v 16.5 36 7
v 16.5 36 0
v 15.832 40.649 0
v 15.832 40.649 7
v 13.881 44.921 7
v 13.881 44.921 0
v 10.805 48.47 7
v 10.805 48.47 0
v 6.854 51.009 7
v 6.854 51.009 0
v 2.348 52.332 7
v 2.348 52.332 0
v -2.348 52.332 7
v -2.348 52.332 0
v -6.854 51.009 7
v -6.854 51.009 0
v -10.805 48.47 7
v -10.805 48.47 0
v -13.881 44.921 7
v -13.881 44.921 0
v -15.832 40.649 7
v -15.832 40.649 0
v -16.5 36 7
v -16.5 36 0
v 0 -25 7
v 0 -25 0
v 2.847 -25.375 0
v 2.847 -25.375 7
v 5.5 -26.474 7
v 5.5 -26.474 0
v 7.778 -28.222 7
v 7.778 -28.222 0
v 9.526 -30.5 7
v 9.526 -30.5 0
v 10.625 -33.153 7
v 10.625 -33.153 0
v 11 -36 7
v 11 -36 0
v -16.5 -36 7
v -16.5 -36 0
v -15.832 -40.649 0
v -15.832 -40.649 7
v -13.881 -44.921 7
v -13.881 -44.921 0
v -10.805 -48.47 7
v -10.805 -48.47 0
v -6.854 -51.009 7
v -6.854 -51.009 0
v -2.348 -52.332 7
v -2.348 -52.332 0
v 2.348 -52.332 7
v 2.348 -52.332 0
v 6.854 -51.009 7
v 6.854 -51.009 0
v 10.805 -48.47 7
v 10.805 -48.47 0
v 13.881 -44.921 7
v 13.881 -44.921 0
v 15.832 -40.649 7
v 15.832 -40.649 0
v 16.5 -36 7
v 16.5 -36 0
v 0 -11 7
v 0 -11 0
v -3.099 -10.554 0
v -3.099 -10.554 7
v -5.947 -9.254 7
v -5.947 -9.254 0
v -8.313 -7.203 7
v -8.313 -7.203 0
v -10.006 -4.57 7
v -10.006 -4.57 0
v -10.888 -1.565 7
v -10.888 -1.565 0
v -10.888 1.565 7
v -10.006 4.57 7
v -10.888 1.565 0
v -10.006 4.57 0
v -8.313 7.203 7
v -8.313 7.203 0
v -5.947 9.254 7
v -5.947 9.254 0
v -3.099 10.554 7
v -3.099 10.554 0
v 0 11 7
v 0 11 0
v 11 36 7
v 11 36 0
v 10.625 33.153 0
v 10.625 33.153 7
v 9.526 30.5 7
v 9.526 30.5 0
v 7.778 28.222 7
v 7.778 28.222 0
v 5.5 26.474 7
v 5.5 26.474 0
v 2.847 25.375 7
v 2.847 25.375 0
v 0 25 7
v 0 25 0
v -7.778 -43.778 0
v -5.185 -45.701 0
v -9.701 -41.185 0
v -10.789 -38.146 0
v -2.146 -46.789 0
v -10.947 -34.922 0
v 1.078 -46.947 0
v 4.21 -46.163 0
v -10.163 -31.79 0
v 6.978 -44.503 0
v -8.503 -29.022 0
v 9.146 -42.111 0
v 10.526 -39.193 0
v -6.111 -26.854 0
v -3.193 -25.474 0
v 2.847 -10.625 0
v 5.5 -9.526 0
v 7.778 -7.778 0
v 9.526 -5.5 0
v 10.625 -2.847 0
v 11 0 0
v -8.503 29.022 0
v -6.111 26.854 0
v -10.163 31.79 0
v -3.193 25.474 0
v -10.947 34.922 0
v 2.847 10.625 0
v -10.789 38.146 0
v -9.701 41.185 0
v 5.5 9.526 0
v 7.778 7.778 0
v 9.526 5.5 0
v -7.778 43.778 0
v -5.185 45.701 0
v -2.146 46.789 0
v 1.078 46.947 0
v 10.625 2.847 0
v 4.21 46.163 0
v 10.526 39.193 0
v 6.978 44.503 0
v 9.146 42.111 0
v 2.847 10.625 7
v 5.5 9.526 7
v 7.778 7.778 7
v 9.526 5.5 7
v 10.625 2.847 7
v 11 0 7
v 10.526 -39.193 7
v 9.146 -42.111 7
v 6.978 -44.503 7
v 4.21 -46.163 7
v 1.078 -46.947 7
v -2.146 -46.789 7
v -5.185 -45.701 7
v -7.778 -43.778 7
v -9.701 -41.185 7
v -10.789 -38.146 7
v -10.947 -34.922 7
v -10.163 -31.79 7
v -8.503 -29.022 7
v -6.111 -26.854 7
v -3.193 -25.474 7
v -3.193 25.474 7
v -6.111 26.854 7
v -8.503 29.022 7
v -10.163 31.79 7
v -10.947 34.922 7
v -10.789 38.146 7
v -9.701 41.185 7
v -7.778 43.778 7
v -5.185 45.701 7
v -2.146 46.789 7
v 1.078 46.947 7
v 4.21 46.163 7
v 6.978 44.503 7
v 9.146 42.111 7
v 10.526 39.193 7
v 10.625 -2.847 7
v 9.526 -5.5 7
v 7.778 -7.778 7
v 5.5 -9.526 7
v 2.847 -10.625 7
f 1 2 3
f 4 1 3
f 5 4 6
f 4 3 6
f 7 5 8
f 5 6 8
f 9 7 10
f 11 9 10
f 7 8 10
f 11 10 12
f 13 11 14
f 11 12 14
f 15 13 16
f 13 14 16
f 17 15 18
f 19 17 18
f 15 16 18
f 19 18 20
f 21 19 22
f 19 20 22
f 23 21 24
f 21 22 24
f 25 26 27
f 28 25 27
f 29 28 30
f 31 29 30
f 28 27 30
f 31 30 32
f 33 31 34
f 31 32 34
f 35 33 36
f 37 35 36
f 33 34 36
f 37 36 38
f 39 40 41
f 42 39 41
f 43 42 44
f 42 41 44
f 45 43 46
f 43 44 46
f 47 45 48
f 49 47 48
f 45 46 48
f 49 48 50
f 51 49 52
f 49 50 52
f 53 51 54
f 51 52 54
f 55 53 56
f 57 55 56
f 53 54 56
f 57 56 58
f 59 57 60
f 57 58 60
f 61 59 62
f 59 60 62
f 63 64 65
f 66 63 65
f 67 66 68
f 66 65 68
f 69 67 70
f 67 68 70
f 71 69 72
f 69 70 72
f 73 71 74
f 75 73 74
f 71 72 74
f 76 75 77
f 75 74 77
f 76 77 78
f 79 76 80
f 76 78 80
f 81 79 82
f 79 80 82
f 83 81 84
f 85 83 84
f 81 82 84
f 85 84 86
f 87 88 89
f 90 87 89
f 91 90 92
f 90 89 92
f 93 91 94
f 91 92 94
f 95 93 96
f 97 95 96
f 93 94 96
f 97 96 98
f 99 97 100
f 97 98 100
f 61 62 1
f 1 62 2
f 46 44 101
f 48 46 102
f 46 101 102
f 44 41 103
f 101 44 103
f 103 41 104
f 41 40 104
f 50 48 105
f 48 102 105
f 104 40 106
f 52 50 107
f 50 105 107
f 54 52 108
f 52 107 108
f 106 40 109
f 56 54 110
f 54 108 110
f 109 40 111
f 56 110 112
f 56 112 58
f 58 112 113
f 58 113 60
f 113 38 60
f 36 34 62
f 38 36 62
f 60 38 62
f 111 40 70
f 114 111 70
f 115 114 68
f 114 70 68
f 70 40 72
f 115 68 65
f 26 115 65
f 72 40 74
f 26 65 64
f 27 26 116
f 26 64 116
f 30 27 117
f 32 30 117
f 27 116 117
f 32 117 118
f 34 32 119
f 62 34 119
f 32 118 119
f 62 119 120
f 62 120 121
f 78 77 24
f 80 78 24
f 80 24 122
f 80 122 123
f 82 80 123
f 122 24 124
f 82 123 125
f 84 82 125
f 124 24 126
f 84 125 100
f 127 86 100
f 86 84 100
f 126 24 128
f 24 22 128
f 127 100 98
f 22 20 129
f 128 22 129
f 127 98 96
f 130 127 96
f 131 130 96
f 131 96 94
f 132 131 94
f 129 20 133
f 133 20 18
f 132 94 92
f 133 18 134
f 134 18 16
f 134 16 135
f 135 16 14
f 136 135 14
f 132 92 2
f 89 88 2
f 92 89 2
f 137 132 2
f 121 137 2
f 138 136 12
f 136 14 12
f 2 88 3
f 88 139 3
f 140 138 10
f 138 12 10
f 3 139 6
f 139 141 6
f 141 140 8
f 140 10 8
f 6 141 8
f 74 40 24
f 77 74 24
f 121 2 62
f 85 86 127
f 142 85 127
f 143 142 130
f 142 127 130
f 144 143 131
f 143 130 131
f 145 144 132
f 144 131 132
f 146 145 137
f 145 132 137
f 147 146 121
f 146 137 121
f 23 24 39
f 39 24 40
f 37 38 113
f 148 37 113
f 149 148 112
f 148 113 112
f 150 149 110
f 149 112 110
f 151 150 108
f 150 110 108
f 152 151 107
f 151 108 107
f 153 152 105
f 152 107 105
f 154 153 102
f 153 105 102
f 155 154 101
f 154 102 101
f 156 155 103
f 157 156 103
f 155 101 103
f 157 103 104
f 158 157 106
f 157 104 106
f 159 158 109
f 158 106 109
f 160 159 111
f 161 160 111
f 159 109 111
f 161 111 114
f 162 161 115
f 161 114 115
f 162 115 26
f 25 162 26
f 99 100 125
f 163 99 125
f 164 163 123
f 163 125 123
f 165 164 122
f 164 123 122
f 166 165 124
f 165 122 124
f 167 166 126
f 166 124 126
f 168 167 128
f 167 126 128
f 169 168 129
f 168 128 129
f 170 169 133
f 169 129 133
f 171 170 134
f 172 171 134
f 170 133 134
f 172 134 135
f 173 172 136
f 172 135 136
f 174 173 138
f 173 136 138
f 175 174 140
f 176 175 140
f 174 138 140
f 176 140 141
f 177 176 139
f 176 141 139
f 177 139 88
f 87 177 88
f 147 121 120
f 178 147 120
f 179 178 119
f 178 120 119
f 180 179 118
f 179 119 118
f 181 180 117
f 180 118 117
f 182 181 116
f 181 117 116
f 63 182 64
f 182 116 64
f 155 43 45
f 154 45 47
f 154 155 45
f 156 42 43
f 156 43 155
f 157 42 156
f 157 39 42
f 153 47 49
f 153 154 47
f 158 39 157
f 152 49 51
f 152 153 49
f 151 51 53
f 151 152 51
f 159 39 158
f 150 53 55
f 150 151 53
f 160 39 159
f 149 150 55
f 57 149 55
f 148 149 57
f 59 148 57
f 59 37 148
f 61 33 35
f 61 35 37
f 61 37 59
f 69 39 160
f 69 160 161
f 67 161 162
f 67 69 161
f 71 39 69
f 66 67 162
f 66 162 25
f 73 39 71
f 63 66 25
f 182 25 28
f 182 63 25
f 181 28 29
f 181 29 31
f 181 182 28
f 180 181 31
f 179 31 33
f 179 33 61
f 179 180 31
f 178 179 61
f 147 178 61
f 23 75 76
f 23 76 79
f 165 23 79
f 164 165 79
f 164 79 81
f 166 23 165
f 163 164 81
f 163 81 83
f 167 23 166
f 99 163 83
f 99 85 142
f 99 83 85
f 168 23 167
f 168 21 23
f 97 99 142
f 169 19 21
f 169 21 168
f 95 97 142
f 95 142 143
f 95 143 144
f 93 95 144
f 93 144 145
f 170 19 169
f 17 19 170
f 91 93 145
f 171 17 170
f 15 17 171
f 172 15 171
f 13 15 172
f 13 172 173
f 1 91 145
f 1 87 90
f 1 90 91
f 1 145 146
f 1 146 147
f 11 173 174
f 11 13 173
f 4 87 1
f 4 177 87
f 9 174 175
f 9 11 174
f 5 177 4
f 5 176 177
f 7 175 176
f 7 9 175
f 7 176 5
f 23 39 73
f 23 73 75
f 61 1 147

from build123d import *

# Parameters (mm, degrees)
F1_DEPTH = 7


# Not quite as in the source:
# - a feature names something its author has since deleted; it is built from what else it names


with BuildPart() as f1:
    # F0 (on Top) → F1 (new body)
    with BuildSketch(Plane.XY):
        with BuildLine():
            ThreePointArc((0, 11), (7.7781745931, 7.7781745931), (11, 0))
            ThreePointArc((11, 0), (7.7781745931, -7.7781745931), (0, -11))
            Line((0, -11), (0, -16.5))
            ThreePointArc((0, -16.5), (11.6672618896, -11.6672618896), (16.5, 0))
            ThreePointArc((16.5, 0), (11.6672618896, 11.6672618896), (0, 16.5))
            Line((0, 16.5), (0, 11))
        make_face()
        with BuildLine():
            ThreePointArc((0, -11), (-11, 0), (0, 11))
            Line((0, 11), (0, 16.5))
            ThreePointArc((0, 16.5), (-11.6672618896, 11.6672618896), (-16.5, 0))
            ThreePointArc((-16.5, 0), (-11.6672618896, -11.6672618896), (0, -16.5))
            Line((0, -16.5), (0, -11))
        make_face()
        with BuildLine():
            Line((0, 19.5), (0, 16.5))
            ThreePointArc((0, 16.5), (11.6672618896, 11.6672618896), (16.5, 0))
            Line((16.5, 0), (16.5, 36))
            ThreePointArc((16.5, 36), (11.6672618896, 24.3327381104), (0, 19.5))
        make_face()
        with BuildLine():
            ThreePointArc((-16.5, 0), (-11.6672618896, 11.6672618896), (0, 16.5))
            Line((0, 16.5), (0, 19.5))
            ThreePointArc((0, 19.5), (-11.6672618896, 24.3327381104), (-16.5, 36))
            Line((-16.5, 36), (-16.5, 0))
        make_face()
        with BuildLine():
            Line((0, -19.5), (0, -16.5))
            ThreePointArc((0, -16.5), (-11.6672618896, -11.6672618896), (-16.5, 0))
            Line((-16.5, 0), (-16.5, -36))
            ThreePointArc((-16.5, -36), (-11.6672618896, -24.3327381104), (0, -19.5))
        make_face()
        with BuildLine():
            ThreePointArc((16.5, 0), (11.6672618896, -11.6672618896), (0, -16.5))
            Line((0, -16.5), (0, -19.5))
            ThreePointArc((0, -19.5), (11.6672618896, -24.3327381104), (16.5, -36))
            Line((16.5, -36), (16.5, 0))
        make_face()
        with BuildLine():
            ThreePointArc((-16.5, 36), (-11.6672618896, 24.3327381104), (0, 19.5))
            ThreePointArc((0, 19.5), (11.6672618896, 24.3327381104), (16.5, 36))
            ThreePointArc((16.5, 36), (0, 52.5), (-16.5, 36))
        make_face()
        with BuildLine():
            ThreePointArc((11, 36), (7.7781745931, 28.2218254069), (0, 25))
            ThreePointArc((0, 25), (-7.7781745931, 43.7781745931), (11, 36))
        make_face(mode=Mode.SUBTRACT)
        with BuildLine():
            ThreePointArc((16.5, -36), (11.6672618896, -24.3327381104), (0, -19.5))
            ThreePointArc((0, -19.5), (-11.6672618896, -24.3327381104), (-16.5, -36))
            ThreePointArc((-16.5, -36), (0, -52.5), (16.5, -36))
        make_face()
        with BuildLine():
            ThreePointArc((11, -36), (-7.7781745931, -43.7781745931), (0, -25))
            ThreePointArc((0, -25), (7.7781745931, -28.2218254069), (11, -36))
        make_face(mode=Mode.SUBTRACT)
    extrude(amount=F1_DEPTH)


solid = f1.part
